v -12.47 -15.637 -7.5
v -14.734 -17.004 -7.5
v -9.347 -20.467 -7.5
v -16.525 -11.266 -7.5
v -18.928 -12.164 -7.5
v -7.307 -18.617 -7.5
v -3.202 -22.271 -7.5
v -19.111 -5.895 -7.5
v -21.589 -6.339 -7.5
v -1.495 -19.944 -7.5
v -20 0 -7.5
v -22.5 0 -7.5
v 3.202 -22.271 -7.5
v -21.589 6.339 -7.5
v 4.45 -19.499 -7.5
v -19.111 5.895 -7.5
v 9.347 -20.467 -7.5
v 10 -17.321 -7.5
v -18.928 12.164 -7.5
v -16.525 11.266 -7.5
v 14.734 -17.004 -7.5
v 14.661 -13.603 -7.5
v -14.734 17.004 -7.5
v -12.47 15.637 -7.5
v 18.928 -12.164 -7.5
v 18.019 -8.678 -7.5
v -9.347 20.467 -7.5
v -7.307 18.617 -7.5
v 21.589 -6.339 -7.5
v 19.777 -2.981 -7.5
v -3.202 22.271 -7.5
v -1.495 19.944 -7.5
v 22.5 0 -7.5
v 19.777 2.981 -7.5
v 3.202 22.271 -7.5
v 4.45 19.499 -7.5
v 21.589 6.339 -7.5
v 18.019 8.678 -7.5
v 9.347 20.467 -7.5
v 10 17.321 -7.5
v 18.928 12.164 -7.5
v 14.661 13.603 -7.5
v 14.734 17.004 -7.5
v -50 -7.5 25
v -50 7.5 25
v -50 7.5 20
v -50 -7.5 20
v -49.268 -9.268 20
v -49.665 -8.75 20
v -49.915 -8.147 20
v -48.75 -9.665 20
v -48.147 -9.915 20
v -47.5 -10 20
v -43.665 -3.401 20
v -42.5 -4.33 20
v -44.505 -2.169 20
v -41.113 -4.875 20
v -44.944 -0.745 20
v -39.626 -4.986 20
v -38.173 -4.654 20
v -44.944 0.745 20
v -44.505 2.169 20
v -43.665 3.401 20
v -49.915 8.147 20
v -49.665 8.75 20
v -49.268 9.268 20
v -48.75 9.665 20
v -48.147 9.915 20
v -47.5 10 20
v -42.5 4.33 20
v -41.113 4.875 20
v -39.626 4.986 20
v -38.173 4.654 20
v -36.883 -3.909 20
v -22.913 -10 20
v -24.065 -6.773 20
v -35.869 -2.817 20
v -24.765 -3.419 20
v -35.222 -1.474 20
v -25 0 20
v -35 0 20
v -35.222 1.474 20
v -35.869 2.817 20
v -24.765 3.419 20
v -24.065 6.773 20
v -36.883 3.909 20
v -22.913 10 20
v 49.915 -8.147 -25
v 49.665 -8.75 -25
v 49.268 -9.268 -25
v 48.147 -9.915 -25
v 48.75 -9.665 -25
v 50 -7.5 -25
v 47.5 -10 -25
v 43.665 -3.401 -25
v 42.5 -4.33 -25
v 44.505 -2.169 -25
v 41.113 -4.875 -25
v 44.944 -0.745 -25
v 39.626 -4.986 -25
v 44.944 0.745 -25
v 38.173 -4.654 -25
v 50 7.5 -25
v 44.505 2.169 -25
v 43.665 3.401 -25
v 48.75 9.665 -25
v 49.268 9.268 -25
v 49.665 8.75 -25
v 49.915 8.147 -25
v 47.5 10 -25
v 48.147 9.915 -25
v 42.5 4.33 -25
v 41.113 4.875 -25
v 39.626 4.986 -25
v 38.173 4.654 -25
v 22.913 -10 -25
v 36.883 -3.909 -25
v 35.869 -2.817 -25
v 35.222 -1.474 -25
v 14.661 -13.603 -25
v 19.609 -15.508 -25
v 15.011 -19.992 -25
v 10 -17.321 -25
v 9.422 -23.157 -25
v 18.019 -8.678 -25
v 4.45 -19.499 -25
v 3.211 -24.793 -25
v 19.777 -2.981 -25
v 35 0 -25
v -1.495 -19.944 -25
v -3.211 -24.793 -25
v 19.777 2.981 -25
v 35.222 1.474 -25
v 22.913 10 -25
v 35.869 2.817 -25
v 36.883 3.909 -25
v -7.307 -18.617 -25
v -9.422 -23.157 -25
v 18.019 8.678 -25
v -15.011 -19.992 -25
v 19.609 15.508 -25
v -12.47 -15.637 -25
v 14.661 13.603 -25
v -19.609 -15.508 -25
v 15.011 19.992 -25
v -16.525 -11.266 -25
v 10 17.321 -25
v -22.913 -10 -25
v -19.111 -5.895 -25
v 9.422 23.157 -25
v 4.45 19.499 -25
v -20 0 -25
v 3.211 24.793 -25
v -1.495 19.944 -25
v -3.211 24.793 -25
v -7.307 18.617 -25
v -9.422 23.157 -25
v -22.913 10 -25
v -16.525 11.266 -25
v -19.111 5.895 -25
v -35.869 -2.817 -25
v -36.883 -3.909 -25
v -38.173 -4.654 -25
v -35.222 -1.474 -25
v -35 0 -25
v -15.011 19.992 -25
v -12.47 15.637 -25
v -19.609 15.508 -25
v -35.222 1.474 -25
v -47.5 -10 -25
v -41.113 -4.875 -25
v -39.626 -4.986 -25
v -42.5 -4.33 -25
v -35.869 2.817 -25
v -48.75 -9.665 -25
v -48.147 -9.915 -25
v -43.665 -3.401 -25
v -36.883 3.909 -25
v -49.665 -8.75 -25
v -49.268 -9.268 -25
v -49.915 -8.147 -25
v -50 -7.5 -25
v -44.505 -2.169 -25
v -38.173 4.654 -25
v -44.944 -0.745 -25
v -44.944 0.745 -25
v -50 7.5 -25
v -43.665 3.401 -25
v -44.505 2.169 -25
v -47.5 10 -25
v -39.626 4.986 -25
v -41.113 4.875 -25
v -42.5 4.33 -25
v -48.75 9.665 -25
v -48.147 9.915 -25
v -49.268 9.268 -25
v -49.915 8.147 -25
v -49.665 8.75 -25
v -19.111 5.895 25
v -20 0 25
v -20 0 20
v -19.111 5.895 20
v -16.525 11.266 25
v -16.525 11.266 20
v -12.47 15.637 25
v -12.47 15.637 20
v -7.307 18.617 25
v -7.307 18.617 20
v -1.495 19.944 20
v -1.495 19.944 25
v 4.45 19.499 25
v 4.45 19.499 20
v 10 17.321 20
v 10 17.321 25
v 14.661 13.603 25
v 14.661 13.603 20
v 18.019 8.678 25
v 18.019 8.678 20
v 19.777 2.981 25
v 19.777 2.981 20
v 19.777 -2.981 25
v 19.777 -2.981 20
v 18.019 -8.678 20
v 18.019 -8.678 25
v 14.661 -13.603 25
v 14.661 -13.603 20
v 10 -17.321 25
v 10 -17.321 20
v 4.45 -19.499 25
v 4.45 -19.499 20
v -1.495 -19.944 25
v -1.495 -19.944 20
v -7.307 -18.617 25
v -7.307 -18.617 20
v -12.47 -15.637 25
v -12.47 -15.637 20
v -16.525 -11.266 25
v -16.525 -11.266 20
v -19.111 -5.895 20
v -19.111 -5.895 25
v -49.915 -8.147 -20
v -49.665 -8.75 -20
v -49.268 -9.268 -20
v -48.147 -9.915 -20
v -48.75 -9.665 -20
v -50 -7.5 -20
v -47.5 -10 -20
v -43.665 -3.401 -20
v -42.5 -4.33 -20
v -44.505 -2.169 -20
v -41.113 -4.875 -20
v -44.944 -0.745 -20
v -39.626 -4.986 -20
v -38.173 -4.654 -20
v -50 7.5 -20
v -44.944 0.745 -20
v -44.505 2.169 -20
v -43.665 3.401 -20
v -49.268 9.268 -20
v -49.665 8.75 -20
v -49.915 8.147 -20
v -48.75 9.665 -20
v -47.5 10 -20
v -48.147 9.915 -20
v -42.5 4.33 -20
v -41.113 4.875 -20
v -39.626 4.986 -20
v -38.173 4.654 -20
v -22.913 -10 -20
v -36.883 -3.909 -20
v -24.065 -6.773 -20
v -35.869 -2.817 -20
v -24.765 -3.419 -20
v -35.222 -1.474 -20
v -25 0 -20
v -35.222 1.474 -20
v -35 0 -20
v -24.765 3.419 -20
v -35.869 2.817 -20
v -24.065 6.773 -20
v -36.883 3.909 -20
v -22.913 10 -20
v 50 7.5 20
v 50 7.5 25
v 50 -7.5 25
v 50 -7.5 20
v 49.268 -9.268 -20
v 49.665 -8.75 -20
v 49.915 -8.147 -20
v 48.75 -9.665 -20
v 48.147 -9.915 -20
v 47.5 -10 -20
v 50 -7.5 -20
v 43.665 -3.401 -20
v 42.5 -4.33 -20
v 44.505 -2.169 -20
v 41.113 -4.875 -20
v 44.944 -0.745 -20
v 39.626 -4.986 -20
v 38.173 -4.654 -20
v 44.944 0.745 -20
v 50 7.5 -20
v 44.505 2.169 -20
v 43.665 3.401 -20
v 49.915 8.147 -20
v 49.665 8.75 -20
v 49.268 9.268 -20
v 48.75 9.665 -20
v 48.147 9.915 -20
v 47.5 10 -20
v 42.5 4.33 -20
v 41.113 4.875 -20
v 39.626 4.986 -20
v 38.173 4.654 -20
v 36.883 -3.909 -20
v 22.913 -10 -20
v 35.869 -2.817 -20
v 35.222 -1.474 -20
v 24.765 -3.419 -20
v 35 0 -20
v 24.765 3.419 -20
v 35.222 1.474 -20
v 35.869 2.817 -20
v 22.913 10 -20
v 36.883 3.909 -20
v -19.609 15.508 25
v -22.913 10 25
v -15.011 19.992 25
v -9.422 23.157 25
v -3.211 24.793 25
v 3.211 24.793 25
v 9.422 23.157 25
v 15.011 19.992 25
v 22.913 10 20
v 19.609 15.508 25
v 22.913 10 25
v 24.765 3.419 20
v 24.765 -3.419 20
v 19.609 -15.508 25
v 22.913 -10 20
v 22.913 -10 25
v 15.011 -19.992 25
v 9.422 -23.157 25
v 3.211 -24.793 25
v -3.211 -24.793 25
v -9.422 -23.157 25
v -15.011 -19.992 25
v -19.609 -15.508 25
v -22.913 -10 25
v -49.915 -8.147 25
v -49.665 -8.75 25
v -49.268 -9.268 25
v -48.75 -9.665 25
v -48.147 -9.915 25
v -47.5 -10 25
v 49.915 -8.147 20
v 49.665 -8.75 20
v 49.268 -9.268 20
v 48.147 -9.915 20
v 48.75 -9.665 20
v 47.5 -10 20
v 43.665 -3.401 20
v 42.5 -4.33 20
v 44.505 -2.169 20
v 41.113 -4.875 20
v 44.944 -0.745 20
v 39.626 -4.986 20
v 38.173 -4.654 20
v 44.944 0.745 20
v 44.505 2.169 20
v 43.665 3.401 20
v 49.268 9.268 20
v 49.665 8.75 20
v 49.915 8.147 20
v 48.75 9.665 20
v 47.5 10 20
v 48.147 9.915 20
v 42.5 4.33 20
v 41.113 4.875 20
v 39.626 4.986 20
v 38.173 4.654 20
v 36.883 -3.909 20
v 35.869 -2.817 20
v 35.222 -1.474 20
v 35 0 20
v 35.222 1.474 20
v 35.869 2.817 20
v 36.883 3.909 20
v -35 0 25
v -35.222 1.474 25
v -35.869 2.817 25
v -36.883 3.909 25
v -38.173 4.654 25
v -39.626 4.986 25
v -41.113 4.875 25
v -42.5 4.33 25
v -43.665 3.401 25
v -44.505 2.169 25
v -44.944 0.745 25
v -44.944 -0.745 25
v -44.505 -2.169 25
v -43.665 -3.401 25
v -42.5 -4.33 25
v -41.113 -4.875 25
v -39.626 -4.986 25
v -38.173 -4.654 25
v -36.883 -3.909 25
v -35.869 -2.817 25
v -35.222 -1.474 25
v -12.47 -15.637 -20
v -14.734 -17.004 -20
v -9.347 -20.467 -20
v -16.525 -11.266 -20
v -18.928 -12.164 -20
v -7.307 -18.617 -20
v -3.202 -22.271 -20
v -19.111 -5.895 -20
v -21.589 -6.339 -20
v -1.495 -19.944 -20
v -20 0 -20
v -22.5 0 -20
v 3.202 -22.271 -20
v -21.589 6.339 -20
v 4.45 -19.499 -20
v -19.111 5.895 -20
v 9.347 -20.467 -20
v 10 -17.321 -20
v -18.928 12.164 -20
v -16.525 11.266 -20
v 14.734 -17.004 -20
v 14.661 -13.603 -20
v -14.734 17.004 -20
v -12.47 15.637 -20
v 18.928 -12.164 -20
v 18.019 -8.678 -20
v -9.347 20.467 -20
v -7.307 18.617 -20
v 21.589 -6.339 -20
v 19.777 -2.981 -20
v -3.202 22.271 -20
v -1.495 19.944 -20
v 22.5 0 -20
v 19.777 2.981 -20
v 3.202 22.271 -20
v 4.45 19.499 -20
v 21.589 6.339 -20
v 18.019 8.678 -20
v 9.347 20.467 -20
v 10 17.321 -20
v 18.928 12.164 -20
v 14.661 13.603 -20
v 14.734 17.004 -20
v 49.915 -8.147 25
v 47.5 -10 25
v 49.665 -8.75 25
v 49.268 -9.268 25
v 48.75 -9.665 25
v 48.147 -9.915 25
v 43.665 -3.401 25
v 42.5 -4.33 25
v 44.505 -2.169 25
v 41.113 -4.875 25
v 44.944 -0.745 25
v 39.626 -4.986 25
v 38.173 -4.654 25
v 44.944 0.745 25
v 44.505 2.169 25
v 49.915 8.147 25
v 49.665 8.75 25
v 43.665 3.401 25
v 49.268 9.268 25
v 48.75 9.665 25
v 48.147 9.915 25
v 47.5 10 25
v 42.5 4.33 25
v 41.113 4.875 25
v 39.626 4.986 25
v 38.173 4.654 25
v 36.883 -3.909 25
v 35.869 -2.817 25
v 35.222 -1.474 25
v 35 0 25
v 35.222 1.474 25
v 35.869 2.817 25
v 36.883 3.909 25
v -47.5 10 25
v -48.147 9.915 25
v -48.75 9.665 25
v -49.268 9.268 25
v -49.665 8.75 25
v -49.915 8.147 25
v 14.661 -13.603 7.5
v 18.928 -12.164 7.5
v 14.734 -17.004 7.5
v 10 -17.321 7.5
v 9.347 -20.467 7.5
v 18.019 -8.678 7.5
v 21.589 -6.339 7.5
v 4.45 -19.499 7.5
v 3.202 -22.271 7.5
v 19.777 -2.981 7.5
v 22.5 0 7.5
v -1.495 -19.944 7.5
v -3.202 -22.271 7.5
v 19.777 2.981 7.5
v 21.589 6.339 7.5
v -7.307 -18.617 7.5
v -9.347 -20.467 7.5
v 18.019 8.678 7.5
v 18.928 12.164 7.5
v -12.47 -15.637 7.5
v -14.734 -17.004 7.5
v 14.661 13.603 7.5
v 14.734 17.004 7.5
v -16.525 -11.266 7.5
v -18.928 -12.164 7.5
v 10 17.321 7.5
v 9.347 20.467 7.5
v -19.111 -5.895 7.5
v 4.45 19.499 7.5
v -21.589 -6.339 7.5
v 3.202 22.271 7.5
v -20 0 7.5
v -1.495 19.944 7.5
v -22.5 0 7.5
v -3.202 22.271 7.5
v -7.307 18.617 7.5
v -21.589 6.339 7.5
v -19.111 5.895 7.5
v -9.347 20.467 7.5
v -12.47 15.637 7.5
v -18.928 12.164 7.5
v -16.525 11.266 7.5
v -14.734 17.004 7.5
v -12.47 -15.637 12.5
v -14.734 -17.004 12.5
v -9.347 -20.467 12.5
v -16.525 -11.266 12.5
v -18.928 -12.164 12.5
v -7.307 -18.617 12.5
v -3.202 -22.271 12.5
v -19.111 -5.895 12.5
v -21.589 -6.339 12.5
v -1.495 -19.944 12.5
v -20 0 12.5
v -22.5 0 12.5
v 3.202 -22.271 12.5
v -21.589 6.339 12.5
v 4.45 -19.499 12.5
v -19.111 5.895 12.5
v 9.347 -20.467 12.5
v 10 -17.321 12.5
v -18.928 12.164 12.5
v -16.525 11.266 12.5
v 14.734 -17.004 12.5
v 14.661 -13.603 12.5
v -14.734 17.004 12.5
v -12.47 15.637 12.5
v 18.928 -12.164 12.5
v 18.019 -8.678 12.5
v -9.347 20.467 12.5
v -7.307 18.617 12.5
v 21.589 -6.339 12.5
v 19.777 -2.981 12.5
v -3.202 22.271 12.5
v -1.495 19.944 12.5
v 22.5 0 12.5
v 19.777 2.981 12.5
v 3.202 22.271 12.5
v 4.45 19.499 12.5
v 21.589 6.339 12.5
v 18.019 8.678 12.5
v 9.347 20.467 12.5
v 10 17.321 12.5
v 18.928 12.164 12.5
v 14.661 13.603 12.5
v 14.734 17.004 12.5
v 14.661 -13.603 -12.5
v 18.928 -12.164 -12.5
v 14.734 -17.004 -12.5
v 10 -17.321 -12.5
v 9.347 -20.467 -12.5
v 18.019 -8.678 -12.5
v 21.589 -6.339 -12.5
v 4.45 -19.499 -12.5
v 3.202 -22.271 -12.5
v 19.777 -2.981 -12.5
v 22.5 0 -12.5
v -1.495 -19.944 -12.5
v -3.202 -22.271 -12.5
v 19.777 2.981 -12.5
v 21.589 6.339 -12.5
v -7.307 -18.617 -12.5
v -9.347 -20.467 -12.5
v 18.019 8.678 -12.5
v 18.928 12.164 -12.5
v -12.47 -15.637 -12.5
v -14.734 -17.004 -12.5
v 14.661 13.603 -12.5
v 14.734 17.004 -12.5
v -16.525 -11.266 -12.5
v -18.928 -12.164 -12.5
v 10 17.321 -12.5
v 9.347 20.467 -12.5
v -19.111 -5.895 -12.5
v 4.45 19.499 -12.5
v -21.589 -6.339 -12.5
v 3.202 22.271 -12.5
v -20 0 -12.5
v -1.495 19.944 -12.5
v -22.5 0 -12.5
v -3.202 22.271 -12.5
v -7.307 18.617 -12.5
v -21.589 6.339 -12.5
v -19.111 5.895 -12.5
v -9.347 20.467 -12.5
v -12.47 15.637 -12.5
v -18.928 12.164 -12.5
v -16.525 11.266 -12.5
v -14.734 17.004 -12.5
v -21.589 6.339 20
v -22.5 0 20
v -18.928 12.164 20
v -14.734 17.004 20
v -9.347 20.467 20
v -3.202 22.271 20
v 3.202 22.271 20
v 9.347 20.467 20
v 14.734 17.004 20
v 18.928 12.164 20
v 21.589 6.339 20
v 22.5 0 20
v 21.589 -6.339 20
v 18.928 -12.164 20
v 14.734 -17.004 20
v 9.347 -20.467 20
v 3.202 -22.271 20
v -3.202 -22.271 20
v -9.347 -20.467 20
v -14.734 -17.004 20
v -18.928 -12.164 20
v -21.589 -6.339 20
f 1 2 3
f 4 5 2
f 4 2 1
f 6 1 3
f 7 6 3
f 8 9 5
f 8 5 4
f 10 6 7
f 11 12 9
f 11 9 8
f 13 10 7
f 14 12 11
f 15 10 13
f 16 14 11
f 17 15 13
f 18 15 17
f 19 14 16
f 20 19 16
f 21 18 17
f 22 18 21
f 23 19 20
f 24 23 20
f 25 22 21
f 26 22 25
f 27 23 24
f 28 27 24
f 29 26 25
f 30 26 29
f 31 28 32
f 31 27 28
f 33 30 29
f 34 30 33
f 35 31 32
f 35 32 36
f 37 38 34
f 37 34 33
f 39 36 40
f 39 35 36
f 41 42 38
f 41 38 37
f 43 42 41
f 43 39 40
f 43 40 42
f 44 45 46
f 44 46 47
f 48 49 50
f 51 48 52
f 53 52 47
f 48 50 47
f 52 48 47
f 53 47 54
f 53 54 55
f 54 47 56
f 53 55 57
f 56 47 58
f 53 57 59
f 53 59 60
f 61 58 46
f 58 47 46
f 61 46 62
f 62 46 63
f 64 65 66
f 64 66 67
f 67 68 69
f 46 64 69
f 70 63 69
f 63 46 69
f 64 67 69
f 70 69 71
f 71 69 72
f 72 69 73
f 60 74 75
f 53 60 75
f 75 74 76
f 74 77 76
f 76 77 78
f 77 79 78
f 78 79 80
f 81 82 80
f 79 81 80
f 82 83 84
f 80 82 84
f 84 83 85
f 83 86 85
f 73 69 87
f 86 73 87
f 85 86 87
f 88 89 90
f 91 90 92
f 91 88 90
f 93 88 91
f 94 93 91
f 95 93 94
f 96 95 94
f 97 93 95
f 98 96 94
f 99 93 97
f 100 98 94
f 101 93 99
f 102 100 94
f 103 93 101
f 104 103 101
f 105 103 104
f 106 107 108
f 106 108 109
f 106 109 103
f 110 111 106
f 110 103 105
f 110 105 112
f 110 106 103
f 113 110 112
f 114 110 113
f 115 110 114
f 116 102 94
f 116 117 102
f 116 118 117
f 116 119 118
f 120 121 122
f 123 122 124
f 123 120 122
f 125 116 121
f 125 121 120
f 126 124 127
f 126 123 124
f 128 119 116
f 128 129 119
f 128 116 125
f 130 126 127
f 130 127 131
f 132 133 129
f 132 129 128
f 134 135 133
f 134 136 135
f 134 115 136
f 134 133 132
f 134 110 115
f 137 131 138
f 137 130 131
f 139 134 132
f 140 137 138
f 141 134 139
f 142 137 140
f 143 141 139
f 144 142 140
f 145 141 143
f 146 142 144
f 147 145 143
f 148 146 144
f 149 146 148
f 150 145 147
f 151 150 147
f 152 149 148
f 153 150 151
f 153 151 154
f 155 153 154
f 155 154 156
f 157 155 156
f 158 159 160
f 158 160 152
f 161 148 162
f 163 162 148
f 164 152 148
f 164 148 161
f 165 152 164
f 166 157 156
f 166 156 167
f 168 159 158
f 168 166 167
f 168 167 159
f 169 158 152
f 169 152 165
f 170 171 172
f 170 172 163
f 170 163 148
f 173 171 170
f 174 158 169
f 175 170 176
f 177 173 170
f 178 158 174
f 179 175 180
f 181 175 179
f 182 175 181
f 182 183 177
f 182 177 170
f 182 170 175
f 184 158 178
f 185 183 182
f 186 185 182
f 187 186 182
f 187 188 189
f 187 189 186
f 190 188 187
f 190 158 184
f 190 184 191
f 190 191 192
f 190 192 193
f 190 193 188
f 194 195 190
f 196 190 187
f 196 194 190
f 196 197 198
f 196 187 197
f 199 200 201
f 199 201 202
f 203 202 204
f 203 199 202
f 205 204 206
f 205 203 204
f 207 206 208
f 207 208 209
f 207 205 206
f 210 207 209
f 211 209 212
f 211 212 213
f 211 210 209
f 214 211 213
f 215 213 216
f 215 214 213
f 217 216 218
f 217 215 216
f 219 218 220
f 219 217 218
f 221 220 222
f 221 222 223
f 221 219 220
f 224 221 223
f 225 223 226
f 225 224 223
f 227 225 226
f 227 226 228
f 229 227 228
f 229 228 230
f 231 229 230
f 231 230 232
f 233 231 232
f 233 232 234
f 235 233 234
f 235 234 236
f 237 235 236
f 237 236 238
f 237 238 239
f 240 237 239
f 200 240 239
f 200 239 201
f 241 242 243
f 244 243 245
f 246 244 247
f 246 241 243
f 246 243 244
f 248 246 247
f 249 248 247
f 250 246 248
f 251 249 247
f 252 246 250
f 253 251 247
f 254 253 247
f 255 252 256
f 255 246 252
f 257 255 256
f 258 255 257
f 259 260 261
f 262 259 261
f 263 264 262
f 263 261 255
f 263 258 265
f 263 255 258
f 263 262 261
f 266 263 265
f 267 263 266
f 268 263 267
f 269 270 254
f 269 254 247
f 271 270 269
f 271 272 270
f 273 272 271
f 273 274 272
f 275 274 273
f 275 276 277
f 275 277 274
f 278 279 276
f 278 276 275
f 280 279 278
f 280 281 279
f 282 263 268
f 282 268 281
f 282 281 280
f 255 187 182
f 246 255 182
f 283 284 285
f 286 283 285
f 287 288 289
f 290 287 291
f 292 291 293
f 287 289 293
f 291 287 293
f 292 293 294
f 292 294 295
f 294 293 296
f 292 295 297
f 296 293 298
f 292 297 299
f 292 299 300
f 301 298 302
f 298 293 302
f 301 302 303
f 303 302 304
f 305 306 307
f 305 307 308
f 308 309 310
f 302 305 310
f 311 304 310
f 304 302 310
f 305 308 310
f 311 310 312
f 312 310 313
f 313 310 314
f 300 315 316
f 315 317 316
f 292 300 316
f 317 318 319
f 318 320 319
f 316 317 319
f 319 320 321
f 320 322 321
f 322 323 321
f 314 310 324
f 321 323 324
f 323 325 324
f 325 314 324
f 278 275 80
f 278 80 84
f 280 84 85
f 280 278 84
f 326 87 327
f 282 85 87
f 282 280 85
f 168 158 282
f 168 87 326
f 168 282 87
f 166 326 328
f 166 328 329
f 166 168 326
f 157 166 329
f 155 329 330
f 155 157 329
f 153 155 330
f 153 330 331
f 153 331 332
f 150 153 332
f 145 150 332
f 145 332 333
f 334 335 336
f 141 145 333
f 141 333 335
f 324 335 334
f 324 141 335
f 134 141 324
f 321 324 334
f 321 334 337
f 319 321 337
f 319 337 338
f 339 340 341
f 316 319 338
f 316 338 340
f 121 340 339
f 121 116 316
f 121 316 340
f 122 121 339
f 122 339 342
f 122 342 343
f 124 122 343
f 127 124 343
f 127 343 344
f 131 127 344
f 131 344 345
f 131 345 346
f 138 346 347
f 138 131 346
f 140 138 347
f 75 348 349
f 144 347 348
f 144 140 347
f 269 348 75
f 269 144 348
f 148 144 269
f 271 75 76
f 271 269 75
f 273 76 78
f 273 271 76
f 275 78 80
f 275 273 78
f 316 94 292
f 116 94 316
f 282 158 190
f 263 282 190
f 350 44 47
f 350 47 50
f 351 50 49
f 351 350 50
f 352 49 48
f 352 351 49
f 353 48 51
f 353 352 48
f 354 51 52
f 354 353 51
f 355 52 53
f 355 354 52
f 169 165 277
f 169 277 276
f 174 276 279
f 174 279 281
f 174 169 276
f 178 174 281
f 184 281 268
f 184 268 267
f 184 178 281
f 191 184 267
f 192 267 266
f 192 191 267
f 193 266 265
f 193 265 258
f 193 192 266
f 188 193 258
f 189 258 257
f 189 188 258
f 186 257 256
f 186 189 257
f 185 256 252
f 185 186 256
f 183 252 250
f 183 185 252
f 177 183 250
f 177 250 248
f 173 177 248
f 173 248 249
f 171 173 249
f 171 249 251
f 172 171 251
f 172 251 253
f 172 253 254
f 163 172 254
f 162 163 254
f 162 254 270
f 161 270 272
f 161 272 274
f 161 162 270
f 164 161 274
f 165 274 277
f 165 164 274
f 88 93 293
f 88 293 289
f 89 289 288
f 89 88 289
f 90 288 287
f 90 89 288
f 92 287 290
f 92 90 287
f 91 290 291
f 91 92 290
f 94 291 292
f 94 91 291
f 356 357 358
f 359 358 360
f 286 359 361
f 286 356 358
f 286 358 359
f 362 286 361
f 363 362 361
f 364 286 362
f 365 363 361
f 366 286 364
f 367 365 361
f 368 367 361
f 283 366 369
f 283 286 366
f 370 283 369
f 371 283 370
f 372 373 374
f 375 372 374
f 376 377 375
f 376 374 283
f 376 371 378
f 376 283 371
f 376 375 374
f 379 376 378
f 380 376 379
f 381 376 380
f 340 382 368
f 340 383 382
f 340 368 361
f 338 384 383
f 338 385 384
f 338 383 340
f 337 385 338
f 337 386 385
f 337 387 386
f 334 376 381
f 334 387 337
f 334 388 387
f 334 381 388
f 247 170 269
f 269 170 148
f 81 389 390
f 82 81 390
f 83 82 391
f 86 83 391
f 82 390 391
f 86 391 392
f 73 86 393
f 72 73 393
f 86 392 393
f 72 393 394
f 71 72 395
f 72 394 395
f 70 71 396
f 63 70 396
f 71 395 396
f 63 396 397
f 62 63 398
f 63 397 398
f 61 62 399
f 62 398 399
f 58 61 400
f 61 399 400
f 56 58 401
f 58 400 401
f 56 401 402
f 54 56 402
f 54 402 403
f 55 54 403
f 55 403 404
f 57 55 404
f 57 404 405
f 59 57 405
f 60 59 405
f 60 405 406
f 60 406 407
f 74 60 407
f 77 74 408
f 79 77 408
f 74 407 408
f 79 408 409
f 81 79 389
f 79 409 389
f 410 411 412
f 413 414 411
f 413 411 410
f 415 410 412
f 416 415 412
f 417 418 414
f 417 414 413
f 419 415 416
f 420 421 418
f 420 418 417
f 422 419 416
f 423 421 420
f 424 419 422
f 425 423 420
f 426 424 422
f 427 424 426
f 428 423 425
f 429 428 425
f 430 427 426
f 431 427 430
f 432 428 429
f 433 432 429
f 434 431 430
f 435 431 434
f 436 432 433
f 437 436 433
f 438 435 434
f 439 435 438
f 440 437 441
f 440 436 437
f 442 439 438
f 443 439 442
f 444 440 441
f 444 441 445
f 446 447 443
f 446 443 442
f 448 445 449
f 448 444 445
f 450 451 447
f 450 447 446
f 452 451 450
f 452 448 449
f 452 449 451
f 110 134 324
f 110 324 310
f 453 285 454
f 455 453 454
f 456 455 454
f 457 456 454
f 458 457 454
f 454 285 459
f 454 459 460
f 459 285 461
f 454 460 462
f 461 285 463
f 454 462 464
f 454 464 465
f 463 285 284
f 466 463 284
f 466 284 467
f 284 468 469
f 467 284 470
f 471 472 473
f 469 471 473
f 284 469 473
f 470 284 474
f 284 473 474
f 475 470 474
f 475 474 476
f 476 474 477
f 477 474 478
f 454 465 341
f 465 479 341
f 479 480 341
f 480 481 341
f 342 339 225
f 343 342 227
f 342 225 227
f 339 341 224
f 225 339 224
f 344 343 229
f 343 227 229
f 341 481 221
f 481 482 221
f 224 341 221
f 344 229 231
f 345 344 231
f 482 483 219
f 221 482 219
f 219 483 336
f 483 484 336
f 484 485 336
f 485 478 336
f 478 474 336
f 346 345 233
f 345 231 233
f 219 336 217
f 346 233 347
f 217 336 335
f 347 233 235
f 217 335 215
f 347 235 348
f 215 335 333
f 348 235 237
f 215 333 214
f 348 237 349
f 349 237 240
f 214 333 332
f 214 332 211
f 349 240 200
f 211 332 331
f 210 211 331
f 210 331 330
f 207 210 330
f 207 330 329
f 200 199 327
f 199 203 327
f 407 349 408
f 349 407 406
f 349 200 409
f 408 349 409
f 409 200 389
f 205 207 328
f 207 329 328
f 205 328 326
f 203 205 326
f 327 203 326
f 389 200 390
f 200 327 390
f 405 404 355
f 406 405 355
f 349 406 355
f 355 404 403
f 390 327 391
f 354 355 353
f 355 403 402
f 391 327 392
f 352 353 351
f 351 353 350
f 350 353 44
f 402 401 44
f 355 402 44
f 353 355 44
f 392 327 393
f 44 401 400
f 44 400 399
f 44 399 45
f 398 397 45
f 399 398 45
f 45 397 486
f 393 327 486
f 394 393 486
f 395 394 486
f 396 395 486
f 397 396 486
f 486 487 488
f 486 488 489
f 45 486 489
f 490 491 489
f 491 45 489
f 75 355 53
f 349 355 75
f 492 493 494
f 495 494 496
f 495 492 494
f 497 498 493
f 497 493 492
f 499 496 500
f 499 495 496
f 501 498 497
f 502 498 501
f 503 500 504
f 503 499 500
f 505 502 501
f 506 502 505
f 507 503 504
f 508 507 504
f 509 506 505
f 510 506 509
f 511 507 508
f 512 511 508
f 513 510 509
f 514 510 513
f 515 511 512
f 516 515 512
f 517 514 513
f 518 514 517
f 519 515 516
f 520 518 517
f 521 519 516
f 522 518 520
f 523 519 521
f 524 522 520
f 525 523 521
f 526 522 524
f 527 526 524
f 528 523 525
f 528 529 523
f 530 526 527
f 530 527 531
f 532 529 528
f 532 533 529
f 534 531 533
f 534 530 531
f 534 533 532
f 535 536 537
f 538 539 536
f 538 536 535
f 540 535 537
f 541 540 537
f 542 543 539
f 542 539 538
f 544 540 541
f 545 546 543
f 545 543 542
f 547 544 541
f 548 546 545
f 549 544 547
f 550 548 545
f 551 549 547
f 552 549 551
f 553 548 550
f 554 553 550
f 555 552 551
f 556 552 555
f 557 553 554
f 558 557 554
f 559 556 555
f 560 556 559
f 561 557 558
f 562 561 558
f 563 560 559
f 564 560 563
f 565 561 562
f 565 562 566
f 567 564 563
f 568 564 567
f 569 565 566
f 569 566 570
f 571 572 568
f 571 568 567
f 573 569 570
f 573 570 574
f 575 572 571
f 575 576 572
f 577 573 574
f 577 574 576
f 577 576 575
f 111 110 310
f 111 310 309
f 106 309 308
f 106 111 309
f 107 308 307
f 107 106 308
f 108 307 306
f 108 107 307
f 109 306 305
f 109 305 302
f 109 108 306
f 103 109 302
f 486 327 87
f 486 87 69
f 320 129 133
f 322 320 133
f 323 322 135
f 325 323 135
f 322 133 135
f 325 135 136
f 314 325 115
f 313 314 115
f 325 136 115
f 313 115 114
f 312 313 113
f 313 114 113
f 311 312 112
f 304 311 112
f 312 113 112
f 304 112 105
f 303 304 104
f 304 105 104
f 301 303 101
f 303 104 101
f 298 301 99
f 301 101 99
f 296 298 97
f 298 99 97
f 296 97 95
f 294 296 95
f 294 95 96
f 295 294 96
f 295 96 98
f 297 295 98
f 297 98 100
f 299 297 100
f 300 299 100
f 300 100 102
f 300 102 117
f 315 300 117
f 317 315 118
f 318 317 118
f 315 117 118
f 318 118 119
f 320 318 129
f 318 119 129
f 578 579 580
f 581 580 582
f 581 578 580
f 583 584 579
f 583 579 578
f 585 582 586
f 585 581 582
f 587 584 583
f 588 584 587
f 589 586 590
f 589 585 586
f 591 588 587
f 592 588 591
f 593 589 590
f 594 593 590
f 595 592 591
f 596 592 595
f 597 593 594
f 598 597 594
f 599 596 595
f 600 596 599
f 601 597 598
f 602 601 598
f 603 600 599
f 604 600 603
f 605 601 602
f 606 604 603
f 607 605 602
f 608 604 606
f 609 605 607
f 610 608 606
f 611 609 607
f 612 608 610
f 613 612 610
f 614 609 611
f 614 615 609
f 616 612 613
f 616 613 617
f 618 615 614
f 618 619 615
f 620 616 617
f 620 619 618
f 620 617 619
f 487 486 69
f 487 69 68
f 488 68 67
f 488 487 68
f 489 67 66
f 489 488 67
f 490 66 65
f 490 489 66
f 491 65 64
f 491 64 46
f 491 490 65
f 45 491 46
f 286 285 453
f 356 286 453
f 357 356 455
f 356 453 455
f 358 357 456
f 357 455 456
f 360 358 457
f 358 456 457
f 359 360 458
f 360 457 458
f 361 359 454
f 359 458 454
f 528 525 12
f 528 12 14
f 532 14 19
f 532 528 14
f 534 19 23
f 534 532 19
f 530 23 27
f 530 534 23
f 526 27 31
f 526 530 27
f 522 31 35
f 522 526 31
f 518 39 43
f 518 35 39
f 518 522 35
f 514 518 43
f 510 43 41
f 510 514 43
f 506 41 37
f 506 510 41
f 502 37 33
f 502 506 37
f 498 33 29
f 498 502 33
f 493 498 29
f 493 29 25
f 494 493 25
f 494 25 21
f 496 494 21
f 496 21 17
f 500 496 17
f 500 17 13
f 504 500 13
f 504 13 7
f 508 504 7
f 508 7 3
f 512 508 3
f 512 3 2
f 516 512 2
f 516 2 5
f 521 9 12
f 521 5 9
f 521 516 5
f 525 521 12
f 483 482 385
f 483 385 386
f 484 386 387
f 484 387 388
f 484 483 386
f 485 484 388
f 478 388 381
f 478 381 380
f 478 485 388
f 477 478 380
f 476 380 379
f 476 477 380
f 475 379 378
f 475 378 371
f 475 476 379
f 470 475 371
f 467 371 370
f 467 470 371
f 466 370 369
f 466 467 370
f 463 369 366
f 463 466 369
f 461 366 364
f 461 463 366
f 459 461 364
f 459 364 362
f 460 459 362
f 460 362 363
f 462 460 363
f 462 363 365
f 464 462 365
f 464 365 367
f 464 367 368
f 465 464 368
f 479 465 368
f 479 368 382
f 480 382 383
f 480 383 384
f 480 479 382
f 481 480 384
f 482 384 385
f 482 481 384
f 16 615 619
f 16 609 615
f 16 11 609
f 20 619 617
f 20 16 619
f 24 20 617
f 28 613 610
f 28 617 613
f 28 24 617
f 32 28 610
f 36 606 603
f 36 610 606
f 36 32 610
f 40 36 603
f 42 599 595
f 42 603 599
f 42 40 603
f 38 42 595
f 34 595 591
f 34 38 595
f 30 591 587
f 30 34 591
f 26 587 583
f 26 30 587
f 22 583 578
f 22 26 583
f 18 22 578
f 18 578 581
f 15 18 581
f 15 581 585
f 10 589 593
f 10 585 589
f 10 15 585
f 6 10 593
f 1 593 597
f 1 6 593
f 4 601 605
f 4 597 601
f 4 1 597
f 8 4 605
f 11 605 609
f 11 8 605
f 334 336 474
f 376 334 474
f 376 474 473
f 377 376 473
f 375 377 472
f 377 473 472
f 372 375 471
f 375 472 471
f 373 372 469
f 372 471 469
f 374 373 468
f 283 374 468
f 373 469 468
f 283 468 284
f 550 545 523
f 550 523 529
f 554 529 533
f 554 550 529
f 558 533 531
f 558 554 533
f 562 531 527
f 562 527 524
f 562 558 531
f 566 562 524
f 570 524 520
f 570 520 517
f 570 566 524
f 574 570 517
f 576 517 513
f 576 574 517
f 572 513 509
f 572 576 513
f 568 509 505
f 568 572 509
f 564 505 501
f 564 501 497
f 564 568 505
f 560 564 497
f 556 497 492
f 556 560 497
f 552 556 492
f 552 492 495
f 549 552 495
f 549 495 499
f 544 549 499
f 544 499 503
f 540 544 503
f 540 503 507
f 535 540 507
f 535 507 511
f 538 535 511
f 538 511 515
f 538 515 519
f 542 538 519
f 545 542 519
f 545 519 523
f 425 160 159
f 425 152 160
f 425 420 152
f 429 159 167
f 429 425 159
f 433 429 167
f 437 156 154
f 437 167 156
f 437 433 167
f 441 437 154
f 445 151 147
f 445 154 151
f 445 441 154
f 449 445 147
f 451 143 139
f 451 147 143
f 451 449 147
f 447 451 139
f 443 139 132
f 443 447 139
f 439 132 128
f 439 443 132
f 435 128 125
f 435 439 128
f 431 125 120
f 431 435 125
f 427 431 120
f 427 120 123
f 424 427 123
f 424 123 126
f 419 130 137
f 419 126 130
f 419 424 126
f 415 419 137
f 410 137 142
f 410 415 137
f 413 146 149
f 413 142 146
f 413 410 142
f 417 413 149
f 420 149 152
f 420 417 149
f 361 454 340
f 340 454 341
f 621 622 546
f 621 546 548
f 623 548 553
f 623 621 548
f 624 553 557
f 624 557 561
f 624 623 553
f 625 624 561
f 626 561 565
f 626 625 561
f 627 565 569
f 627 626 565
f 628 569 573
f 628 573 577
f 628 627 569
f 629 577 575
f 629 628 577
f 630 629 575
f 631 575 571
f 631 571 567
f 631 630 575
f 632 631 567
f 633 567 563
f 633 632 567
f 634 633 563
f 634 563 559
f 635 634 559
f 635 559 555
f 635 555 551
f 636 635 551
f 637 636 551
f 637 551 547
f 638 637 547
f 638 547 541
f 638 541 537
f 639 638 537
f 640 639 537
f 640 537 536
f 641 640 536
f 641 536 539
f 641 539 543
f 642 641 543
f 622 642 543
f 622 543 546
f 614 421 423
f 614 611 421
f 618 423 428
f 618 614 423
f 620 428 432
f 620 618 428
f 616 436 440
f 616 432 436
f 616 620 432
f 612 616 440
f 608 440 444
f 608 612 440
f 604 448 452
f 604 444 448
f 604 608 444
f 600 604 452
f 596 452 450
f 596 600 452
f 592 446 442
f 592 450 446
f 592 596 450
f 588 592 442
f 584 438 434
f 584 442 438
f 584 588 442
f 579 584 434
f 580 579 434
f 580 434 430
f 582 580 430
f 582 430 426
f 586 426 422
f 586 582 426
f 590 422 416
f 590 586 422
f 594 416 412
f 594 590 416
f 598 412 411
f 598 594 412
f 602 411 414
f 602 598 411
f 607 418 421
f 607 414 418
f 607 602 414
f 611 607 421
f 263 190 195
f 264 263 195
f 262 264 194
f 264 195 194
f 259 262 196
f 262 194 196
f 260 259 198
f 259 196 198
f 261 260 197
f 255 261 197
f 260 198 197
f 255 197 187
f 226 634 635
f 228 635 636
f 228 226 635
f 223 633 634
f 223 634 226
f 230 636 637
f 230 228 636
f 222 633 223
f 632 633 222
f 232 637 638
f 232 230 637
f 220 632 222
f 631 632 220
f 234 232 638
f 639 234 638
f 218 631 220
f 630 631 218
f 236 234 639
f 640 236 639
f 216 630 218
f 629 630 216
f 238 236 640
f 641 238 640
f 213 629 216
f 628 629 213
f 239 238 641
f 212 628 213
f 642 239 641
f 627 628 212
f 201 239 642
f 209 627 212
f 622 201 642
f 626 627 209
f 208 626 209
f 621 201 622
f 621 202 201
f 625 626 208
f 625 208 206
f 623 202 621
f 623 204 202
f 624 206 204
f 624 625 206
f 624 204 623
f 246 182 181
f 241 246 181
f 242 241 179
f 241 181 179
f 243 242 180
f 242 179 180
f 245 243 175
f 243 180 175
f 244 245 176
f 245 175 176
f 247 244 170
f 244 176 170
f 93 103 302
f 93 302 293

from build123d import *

# Parameters (mm, degrees)
F2_R     = 5
F3_DEPTH = 5


with BuildPart() as f1:
    # F0 (on Front) → F1 (revolve)
    with BuildSketch(Plane.XZ):
        Polygon((-25, 25), (-25, 0), (-22.5, 0), (-22.5, 7.5), (-20, 7.5), (-20, 12.5), (-22.5, 12.5), (-22.5, 20), (-20, 20), (-20, 25), align=None)
        Polygon((-22.5, 0), (-25, 0), (-25, -25), (-20, -25), (-20, -20), (-22.5, -20), (-22.5, -12.5), (-20, -12.5), (-20, -7.5), (-22.5, -7.5), align=None)
    revolve(axis=Axis((0, 0, 7.500000298), (0, 0, -1)))

    # F2 (on face) → F3 (join)
    with BuildSketch(Plane.XY.offset(25)):
        with BuildLine():
            ThreePointArc((-22.9128784748, -10), (-25, 0), (-22.9128784748, 10))
            Line((-22.9128784748, 10), (-47.5, 10))
            ThreePointArc((-47.5, 10), (-49.267766953, 9.267766953), (-50, 7.5))
            Line((-50, 7.5), (-50, 0))
            Line((-50, 0), (-50, -7.5))
            ThreePointArc((-50, -7.5), (-49.267766953, -9.267766953), (-47.5, -10))
            Line((-47.5, -10), (-22.9128784748, -10))
        make_face()
        with Locations((-40, 0)):
            Circle(F2_R, mode=Mode.SUBTRACT)
    extrude(amount=-F3_DEPTH)

    # F4: F1 across plane


with BuildPart() as f1_1:
    add(f1.part)
    add(f1.part.mirror(Plane.YZ))

    # F5: F1 across plane


with BuildPart() as f1_2:
    add(f1_1.part)
    add(f1_1.part.mirror(Plane.XY))


solid = f1_2.part
